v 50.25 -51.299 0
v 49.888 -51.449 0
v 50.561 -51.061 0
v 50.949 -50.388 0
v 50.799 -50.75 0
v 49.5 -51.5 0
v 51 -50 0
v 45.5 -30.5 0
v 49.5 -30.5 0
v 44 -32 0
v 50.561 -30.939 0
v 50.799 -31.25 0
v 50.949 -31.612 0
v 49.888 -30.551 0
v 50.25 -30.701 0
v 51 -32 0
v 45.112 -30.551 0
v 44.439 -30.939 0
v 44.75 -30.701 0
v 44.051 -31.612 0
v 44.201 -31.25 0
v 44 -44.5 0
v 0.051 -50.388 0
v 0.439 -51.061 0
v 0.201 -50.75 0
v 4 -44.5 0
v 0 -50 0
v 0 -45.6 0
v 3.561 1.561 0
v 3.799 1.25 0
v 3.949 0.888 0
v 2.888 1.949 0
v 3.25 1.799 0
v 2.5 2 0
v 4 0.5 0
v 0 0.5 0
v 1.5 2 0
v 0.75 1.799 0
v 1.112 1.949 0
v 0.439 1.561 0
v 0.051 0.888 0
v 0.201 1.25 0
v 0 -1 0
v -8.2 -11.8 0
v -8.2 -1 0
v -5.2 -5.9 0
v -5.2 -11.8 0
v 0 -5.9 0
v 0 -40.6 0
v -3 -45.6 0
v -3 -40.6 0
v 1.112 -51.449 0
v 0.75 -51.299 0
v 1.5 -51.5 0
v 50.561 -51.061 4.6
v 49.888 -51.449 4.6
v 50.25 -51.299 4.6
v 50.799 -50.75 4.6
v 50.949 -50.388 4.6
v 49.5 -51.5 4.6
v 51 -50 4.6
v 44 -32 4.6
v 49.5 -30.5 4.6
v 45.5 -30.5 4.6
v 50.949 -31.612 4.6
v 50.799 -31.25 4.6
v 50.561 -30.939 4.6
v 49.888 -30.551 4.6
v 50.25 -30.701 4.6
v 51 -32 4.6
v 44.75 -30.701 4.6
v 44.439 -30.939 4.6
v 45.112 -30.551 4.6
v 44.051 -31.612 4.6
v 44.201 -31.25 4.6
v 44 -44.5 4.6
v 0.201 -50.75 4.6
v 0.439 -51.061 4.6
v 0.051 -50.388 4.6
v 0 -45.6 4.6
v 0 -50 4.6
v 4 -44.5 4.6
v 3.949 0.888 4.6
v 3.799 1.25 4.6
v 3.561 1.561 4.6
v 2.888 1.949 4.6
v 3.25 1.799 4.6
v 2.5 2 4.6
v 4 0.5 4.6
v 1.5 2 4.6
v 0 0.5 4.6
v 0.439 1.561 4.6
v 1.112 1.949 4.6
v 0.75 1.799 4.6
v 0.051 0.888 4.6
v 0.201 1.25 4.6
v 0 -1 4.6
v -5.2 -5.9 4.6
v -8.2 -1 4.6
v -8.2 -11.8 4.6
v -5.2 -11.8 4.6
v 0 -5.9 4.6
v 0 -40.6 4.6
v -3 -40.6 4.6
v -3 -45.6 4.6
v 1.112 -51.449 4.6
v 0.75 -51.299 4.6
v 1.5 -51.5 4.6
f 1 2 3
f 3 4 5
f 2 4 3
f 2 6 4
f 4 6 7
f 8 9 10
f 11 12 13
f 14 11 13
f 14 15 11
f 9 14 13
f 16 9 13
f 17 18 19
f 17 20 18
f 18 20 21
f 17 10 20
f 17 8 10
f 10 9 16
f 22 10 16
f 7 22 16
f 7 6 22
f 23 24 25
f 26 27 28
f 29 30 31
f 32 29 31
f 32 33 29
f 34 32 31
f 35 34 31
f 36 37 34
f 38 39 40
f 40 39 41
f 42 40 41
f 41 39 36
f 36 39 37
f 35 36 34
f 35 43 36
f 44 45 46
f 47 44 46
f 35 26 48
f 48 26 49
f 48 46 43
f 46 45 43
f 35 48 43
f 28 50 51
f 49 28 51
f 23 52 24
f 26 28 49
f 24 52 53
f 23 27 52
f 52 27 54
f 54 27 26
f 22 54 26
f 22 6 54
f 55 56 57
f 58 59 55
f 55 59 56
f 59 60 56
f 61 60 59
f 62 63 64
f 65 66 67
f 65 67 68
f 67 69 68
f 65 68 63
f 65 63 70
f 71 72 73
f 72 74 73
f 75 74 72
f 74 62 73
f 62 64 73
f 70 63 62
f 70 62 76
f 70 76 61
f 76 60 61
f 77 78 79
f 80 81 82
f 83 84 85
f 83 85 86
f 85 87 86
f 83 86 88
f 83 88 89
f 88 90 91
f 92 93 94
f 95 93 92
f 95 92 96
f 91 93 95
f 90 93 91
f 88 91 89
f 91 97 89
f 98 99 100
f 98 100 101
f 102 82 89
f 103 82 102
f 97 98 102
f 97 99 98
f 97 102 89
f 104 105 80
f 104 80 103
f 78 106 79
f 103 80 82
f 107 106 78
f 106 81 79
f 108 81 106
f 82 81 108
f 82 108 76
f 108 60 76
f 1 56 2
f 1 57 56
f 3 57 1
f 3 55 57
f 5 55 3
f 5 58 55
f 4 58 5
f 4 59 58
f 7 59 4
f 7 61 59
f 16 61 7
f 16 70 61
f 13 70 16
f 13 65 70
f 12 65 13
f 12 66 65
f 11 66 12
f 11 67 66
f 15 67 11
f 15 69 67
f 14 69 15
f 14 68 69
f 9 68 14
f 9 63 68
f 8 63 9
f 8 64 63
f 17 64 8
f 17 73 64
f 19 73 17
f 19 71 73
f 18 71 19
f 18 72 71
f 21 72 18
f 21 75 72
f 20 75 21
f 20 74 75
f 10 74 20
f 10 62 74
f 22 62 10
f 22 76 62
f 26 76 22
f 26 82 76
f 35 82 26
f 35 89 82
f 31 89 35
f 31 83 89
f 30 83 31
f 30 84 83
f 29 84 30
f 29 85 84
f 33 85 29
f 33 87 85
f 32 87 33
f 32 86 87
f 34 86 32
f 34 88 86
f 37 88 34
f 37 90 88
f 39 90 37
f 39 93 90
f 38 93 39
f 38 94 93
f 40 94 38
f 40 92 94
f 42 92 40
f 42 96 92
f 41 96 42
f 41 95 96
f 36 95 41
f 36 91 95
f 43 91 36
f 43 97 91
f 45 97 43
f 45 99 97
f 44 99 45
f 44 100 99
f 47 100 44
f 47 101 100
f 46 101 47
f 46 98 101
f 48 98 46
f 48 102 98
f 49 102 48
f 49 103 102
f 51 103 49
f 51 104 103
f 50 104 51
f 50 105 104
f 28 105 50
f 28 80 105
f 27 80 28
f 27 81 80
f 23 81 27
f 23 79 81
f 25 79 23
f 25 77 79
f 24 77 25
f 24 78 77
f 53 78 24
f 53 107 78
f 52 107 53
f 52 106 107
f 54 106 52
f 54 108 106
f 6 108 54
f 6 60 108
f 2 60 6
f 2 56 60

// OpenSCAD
// J-hook for the SKÅDIS board (headset, cables, bags), hung the IKEA way: a tab through a
// slot with a lip behind the board, plus a short peg in the slot 40 mm below so it
// cannot tip or swing. Lift, push in, drop 6 mm; lift to take it off.
//
// Side profile, u out from the front face, v up from the upper slot's centre:
//   tab   u -5.2..0, v -5.9..-1  (rests on the slot's rounded bottom)
//   lip   u -8.2..-5.2, v -11.8..-1  (6 mm behind solid board below the slot)
//   peg   u -3..0, v -45.6..-40.6  (in the slot below; 5.9 mm drop leaves it inside)
// Raised 5.9 mm for fitting, tab and lip (v -5.9..5) pass the slot, whose straight width for a
// 4.6 mm tab is about 12 mm because of the rounded ends; the peg stays inside its slot.
//
// Print on its side, as saved, PETG, 4 walls, 40 % infill: the layers run along the arm.
//   openscad -o skadis-hook-x4.stl skadis-hook.scad

reach = 40;     // clear space from the board to the tip
tip = 14;       // tip height above the arm
w = 4.6;        // width; the tab, lip and peg must stay 4.6 to pass the 5 mm slot
arm = 7;        // arm and spine depth
spine_u = 4;    // spine thickness on the front face

module mount2d() {
    translate([-5.2, -5.9]) square([5.2 + 0.01, 4.9]);    // tab
    translate([-8.2, -11.8]) square([3, 10.8]);            // lip
    translate([-3, -45.6]) square([3 + 0.01, 5]);          // peg in the slot below
}
module body2d() {
    v0 = -48 - arm / 2;
    offset(r = 1.5, $fn = 24) offset(delta = -1.5) union() {
        translate([0, v0]) square([spine_u, 2 - v0]);                          // spine up the front
        translate([0, v0]) square([spine_u + reach + arm, arm]);               // arm
        translate([spine_u + reach, v0]) square([arm, arm + tip]);             // tip
    }
}
linear_extrude(w) { mount2d(); body2d(); }
